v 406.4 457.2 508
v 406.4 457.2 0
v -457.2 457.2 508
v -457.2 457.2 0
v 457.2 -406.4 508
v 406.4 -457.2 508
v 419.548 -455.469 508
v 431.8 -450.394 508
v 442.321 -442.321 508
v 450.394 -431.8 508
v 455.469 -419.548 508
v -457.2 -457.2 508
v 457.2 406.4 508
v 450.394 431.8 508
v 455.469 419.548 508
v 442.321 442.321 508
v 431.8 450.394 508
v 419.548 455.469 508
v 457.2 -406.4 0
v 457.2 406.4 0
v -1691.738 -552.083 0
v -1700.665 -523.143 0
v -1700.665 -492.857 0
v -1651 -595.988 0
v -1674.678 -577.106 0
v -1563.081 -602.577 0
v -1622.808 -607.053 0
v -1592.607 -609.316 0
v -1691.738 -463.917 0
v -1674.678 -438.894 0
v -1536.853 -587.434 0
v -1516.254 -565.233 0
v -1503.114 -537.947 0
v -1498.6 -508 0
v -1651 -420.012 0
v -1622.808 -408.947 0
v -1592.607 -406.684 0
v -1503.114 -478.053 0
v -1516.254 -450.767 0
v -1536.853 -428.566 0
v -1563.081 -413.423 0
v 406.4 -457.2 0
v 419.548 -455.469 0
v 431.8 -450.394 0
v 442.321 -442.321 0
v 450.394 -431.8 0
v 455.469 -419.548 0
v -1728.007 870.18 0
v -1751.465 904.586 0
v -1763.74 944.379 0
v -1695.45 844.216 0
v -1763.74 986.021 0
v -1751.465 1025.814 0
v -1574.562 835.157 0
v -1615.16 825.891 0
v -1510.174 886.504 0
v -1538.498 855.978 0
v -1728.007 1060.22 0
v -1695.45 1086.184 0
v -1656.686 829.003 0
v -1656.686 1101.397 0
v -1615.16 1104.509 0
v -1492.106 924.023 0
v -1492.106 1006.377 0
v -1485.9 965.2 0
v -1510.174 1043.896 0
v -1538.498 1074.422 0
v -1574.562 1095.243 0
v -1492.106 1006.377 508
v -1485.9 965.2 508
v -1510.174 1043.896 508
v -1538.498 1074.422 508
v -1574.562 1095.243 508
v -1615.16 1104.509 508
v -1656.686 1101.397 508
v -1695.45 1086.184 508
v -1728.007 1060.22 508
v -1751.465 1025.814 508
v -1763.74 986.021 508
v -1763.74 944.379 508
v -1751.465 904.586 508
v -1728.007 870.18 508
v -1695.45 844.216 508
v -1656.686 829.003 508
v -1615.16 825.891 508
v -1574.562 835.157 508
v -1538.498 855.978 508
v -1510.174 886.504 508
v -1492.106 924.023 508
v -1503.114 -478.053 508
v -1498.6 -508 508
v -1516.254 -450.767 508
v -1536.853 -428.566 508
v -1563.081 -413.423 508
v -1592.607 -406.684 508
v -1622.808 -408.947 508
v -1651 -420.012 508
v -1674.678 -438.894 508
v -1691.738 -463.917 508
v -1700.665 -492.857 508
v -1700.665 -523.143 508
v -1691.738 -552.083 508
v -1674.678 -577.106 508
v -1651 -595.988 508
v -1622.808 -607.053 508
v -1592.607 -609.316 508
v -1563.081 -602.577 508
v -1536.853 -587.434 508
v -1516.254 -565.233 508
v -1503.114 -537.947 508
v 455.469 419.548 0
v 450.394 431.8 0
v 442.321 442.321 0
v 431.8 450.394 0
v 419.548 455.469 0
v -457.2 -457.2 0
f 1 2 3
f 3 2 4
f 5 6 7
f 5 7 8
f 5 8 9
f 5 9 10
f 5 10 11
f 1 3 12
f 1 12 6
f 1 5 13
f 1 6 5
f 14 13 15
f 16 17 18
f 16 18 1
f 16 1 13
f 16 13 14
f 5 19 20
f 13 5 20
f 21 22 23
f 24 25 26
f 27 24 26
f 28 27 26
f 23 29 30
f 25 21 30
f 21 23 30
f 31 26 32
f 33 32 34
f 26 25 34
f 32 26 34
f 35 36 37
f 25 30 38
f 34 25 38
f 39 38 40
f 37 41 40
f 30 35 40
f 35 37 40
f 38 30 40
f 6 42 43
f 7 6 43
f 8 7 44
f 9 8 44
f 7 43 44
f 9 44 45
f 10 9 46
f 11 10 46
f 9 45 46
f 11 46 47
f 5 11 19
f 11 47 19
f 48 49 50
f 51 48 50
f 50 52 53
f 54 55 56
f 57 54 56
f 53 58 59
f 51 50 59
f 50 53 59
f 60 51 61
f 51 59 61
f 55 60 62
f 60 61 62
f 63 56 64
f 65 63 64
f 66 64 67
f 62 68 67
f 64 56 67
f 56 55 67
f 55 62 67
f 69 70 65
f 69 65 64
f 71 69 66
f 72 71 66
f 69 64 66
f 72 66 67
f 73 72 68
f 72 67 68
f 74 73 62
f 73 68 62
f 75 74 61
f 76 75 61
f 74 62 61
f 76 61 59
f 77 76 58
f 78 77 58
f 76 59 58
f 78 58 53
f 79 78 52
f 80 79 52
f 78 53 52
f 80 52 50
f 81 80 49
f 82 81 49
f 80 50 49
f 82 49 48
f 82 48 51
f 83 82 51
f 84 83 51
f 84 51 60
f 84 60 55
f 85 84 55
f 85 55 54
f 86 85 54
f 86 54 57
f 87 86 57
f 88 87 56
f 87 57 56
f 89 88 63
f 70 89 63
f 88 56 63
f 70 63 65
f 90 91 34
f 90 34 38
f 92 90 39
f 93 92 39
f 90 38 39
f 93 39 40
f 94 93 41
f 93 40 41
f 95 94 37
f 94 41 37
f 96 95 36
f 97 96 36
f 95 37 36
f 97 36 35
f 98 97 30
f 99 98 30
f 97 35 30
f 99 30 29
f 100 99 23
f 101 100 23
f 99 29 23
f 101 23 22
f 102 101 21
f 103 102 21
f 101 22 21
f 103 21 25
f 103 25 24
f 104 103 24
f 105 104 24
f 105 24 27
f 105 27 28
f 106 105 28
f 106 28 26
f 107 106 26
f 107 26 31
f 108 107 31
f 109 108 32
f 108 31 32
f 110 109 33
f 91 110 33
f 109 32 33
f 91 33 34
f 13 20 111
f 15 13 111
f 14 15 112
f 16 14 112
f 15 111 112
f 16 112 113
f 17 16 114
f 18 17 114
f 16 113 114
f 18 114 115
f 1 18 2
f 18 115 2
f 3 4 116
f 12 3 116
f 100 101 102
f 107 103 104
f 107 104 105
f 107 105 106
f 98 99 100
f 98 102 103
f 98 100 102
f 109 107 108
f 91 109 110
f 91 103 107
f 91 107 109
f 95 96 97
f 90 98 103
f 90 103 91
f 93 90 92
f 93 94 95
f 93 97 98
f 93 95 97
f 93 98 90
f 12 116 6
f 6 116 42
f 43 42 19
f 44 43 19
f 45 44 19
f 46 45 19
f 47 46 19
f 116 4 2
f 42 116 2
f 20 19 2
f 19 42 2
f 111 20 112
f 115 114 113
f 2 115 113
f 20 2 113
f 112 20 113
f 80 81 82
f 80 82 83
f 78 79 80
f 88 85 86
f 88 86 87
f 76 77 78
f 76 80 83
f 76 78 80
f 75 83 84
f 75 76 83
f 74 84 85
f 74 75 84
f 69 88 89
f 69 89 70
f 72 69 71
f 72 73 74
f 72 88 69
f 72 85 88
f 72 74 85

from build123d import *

# Parameters (mm, degrees)
F1_DEPTH = 508
F2_R     = 101.6
F3_DEPTH = 508
F4_R     = 139.7
F5_DEPTH = 508


with BuildPart() as f1:
    # F0 (on Top) → F1 (new body)
    with BuildSketch(Plane.XY):
        with BuildLine():
            ThreePointArc((457.2, 406.4), (442.321024, 442.321024), (406.4, 457.2))
            Line((406.4, 457.2), (-457.2, 457.2))
            Line((-457.2, 457.2), (-457.2, -457.2))
            Line((-457.2, -457.2), (406.4, -457.2))
            ThreePointArc((406.4, -457.2), (442.321024, -442.321024), (457.2, -406.4))
            Line((457.2, -406.4), (457.2, 406.4))
        make_face()
    extrude(amount=F1_DEPTH)


with BuildPart() as f3:
    # F2 (on Top) → F3 (new body)
    with BuildSketch(Plane.XY):
        with Locations((-1600.2, -508)):
            Circle(F2_R)
    extrude(amount=F3_DEPTH)


with BuildPart() as f5:
    # F4 (on Top) → F5 (new body)
    with BuildSketch(Plane.XY):
        with Locations((-1625.6, 965.2)):
            Circle(F4_R)
    extrude(amount=F5_DEPTH)


solid = Compound([f1.part, f3.part, f5.part])
